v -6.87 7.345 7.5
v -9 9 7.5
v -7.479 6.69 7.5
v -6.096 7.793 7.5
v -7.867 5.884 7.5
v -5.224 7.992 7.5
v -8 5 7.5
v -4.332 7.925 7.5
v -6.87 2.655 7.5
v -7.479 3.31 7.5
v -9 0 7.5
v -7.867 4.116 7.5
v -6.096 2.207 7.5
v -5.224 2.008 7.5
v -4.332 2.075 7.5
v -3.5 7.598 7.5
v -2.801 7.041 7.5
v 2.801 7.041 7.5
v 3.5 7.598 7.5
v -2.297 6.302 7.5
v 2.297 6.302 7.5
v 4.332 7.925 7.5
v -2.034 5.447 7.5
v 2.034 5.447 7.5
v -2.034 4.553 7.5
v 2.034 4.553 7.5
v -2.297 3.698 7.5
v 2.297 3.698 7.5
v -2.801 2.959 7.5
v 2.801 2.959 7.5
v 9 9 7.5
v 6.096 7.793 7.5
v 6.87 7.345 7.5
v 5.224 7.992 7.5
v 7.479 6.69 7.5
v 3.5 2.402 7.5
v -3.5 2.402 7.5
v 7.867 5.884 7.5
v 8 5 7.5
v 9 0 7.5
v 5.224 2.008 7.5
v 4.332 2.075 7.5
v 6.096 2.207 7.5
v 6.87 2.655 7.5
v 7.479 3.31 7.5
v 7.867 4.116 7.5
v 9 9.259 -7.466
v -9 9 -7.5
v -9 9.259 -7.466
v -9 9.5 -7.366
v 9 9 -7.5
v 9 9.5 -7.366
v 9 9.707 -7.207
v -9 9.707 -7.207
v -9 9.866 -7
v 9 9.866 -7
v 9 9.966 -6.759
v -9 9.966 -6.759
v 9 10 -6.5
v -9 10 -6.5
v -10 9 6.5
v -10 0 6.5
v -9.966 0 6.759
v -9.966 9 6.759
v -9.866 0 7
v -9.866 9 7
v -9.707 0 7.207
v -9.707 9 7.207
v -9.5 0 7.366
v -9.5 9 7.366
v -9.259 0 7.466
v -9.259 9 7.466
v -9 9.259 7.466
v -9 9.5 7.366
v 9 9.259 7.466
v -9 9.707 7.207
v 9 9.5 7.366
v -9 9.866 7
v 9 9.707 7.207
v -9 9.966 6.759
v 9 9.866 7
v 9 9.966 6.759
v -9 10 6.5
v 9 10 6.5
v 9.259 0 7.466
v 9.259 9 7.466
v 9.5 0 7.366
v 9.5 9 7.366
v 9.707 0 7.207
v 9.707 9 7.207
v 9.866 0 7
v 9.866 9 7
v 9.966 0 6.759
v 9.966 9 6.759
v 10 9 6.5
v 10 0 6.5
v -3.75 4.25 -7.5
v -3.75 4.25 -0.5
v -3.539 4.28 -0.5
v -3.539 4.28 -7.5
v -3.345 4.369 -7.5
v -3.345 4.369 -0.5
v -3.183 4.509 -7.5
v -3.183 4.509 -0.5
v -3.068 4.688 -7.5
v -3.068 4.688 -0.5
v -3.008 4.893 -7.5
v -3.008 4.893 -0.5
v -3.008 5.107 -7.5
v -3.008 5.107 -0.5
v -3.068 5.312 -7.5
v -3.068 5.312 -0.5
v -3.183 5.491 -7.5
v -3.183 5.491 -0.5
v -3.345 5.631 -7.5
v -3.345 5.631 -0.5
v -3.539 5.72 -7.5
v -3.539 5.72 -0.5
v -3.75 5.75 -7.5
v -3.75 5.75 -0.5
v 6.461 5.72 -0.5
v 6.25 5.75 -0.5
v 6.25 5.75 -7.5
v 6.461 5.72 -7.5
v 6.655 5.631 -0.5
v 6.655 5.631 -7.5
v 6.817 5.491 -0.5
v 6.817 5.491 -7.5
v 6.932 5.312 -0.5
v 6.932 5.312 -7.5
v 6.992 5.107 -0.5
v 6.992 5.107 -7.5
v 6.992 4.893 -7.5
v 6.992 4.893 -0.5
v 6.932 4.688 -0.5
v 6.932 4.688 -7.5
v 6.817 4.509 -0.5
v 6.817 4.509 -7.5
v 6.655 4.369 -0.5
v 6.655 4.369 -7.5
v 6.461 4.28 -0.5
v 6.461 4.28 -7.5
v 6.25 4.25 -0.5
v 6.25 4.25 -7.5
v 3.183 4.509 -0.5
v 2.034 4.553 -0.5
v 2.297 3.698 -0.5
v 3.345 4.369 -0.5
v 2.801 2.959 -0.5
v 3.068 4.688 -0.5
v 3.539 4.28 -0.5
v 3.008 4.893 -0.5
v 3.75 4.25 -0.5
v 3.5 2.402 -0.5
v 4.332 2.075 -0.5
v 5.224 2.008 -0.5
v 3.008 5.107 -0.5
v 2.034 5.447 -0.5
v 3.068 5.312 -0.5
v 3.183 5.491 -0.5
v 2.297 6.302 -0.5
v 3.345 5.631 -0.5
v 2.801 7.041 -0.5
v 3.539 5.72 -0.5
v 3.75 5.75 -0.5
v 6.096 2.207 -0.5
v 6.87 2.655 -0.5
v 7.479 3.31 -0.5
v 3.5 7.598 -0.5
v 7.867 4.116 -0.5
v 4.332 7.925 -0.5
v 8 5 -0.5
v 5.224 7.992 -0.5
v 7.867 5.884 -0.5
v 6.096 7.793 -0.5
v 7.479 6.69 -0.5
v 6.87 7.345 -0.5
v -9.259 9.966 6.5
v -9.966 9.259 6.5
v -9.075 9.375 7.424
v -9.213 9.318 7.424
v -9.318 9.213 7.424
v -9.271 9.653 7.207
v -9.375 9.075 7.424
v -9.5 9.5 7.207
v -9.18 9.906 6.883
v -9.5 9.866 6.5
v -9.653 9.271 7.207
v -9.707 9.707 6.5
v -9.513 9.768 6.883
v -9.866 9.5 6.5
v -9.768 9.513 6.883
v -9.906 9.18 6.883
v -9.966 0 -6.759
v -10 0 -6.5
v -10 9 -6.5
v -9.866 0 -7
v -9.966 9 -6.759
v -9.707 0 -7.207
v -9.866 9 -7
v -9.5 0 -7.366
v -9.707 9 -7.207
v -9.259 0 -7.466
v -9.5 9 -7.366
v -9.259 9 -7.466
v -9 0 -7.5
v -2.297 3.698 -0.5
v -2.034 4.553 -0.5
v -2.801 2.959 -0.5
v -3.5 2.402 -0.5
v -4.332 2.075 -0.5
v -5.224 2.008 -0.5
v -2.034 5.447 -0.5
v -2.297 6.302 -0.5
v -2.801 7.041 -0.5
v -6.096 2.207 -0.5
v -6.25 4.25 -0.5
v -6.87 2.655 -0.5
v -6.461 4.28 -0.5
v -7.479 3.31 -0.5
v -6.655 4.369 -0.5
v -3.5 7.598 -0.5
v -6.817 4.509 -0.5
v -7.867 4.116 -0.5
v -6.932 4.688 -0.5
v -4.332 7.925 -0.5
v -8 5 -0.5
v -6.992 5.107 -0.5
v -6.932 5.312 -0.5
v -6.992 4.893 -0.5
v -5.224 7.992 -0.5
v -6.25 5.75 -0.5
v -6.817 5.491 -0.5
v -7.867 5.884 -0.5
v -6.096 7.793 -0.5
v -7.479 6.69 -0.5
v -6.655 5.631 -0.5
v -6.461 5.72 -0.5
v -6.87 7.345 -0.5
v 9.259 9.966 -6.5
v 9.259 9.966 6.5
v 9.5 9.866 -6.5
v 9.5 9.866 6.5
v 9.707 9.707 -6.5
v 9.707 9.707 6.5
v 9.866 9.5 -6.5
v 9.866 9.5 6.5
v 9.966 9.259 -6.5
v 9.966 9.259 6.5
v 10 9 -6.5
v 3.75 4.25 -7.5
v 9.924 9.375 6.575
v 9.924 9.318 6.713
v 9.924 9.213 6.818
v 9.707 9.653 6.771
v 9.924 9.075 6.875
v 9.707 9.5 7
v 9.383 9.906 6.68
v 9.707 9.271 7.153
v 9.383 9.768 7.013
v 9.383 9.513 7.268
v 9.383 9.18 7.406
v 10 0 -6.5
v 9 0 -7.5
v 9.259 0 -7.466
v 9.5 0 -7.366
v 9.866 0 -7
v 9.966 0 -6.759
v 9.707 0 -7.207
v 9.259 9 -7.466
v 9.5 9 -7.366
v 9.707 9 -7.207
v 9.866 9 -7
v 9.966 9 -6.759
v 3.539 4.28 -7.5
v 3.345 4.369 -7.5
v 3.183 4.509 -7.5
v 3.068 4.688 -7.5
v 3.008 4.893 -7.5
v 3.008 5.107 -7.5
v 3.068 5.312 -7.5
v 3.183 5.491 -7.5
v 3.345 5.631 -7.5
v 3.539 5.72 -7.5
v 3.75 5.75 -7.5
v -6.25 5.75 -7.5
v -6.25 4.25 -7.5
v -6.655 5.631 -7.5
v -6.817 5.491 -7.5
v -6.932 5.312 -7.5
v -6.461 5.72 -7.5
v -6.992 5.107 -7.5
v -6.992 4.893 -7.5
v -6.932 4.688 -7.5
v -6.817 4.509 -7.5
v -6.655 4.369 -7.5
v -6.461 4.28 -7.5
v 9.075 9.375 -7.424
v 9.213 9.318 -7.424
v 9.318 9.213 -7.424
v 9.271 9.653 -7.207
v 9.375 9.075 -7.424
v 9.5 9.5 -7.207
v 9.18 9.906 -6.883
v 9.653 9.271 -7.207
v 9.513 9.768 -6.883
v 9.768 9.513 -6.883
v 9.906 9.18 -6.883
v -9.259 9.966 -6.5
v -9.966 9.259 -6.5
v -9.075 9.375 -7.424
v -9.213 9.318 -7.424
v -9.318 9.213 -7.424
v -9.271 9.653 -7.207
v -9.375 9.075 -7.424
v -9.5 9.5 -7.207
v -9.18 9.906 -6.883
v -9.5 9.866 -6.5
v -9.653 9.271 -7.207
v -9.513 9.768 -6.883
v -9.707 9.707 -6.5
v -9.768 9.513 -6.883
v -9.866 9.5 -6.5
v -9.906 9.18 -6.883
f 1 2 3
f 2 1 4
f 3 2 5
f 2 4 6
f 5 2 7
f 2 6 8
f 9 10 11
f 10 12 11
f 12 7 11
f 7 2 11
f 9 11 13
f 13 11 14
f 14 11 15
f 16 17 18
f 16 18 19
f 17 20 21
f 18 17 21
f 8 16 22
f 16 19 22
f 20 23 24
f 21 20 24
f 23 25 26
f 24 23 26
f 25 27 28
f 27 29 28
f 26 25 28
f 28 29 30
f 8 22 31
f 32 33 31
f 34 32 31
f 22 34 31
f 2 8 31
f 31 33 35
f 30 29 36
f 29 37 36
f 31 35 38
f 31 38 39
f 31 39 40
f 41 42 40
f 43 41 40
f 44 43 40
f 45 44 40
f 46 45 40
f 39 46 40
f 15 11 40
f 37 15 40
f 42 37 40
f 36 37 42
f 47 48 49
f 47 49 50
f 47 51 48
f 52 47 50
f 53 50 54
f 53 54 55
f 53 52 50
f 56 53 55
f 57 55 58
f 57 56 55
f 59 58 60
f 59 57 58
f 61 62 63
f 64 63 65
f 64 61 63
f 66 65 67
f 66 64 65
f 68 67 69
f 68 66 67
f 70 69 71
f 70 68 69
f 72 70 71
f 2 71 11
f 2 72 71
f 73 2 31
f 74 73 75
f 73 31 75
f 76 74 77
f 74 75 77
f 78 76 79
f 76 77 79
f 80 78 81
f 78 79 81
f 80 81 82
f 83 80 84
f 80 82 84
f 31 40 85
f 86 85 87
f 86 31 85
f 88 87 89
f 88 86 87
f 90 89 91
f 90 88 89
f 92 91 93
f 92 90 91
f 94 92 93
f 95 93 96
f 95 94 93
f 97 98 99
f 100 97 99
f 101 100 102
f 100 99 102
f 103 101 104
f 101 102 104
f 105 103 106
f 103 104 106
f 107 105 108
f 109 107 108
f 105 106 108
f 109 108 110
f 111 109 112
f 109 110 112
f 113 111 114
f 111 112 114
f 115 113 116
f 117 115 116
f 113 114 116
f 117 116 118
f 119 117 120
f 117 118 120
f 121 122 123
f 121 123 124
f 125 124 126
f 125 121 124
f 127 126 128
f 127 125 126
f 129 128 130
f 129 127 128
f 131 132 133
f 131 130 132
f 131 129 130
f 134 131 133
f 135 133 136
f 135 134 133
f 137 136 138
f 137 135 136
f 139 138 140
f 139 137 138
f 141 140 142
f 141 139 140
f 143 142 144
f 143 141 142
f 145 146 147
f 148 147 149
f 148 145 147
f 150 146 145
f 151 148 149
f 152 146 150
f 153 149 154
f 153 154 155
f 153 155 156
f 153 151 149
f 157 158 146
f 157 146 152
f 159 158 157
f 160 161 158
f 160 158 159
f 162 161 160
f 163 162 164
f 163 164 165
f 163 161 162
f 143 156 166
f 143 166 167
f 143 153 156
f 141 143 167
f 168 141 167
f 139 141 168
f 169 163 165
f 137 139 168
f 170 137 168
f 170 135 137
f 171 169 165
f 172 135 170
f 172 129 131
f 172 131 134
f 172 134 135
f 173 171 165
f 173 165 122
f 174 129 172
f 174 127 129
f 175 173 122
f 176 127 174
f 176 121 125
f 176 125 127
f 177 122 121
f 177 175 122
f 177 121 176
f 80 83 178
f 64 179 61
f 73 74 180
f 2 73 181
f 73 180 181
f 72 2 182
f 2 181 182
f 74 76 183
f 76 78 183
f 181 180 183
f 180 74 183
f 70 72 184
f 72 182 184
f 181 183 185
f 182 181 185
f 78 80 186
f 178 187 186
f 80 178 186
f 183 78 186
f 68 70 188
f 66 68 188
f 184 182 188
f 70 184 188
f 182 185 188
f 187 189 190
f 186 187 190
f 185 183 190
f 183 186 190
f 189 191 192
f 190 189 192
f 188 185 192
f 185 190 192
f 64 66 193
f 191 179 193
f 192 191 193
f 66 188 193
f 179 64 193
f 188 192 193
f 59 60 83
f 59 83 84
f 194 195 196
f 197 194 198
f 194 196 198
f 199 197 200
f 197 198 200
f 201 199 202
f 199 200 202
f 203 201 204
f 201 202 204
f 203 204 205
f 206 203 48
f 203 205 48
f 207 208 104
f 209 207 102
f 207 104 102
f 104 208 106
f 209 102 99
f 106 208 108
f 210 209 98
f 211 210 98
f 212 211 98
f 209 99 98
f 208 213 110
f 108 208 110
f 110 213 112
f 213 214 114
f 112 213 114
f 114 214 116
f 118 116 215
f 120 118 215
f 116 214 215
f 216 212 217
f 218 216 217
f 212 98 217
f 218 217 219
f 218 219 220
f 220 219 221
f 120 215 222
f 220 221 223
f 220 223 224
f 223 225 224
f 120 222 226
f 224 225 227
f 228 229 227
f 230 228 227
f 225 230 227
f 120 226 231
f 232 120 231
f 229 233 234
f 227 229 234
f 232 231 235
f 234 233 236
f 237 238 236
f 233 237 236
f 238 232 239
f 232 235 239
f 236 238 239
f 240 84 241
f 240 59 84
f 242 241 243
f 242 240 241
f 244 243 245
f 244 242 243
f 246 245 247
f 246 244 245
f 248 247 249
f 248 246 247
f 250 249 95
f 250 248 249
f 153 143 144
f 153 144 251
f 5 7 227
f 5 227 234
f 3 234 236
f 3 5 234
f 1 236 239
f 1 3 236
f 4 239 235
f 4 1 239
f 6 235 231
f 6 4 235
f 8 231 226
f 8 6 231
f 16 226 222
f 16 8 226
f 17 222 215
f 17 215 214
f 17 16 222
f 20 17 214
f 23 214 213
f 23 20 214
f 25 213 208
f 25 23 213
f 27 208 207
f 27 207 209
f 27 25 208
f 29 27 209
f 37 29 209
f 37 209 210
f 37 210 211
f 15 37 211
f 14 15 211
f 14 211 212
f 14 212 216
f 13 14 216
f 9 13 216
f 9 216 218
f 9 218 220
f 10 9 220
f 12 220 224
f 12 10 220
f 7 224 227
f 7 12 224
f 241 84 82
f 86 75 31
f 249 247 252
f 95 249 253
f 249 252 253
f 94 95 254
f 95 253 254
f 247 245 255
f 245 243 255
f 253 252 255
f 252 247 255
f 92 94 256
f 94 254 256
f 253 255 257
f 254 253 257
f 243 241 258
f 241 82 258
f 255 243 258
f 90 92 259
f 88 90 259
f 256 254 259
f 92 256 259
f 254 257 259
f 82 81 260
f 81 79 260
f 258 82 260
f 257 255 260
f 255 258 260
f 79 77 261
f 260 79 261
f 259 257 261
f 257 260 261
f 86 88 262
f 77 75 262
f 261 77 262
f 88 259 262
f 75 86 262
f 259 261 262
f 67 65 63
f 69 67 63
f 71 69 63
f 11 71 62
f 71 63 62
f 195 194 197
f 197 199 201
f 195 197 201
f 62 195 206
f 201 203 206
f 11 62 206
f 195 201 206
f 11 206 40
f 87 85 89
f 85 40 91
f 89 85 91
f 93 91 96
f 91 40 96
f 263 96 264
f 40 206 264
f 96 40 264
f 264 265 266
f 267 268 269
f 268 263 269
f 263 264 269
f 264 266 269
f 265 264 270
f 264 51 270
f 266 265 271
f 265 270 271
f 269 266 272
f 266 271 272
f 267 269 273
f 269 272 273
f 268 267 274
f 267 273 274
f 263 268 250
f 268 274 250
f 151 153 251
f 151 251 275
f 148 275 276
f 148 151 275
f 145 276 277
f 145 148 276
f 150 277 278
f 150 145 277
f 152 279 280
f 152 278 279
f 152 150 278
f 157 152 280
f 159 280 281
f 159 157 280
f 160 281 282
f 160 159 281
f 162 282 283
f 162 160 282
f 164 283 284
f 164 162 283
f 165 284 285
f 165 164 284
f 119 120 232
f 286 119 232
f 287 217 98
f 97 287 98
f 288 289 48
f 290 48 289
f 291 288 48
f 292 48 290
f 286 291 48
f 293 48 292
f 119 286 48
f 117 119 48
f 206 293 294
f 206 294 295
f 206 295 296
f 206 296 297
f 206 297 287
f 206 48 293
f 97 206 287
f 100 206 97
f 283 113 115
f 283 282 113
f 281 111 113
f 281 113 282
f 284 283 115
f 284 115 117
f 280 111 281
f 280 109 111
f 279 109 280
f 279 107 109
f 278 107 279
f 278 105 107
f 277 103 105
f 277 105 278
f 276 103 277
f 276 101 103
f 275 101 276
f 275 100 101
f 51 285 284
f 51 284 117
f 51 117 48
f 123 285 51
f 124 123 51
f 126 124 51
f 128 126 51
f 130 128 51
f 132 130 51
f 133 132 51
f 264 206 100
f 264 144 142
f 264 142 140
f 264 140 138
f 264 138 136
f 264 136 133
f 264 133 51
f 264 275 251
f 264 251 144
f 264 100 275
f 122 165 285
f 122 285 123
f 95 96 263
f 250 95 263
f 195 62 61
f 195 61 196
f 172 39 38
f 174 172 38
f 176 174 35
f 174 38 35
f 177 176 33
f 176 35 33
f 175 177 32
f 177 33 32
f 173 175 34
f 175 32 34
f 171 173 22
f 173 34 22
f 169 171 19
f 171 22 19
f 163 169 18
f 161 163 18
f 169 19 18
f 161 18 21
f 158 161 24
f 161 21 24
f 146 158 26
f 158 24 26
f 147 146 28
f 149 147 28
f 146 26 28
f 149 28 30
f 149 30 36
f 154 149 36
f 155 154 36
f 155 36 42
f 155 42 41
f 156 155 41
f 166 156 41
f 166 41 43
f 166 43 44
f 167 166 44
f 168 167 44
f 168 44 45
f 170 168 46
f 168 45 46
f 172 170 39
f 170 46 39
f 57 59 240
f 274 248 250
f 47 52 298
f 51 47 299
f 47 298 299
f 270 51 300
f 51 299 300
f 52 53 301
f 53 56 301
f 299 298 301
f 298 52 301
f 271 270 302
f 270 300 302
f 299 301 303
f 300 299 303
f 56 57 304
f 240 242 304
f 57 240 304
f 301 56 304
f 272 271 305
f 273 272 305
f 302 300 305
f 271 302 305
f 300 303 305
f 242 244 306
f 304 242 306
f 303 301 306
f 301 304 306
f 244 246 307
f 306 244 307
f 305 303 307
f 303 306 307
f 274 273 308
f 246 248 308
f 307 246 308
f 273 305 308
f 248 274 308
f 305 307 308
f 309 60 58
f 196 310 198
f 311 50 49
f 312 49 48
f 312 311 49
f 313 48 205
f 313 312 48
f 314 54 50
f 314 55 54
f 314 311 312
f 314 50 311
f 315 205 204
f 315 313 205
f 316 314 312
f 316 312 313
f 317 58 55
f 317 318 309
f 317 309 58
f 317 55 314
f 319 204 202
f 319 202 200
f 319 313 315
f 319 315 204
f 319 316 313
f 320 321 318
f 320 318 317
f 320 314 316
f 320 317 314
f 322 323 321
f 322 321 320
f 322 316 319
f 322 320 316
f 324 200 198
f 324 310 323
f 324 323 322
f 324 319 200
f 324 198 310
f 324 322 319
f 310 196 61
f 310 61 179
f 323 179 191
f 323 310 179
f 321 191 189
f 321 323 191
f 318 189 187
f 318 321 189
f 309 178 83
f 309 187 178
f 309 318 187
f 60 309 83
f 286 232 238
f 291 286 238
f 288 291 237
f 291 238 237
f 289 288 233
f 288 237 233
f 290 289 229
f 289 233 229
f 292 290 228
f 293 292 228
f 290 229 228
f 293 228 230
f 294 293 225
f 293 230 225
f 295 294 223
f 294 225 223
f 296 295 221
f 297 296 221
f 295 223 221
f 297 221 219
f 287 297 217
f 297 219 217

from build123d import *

# Parameters (mm, degrees)
SKETCH1_W           = 20
SKETCH1_H           = 15
BOSS_EXTRUDE1_DEPTH = 10
SKETCH4_R           = 3
CUT_EXTRUDE1_DEPTH  = 8
CUT_EXTRUDE2_DEPTH  = 8
FILLET1_R           = 1


with BuildPart() as part:
    # Sketch1 → Boss-Extrude1 (new body)
    with BuildSketch(Plane(origin=(0, 0, 0), x_dir=(1, 0, 0), z_dir=(0, 1, 0))):
        Rectangle(SKETCH1_W, SKETCH1_H)
    extrude(amount=BOSS_EXTRUDE1_DEPTH)

    # Sketch4 → Cut-Extrude1 (cut)
    with BuildSketch(Plane.XY.offset(7.5)):
        with Locations((5, 5)):
            Circle(SKETCH4_R)
    cut_extrude1 = extrude(amount=-CUT_EXTRUDE1_DEPTH, mode=Mode.SUBTRACT)

    # Sketch6 → Cut-Extrude2 (cut, through all)
    with BuildSketch(Plane.XY.offset(-0.5)):
        with BuildLine():
            Line((3.75, 5.75), (6.25, 5.75))
            ThreePointArc((6.25, 5.75), (7, 5), (6.25, 4.25))
            Line((6.25, 4.25), (3.75, 4.25))
            ThreePointArc((3.75, 4.25), (3, 5), (3.75, 5.75))
        make_face()
    cut_extrude2 = extrude(amount=-CUT_EXTRUDE2_DEPTH, mode=Mode.SUBTRACT)

    # Mirror1: Cut-Extrude1, Cut-Extrude2 across plane
    add(cut_extrude1.mirror(Plane(origin=(0, 0, 0), x_dir=(0, 0, 1), z_dir=(1, 0, 0))), mode=Mode.SUBTRACT)
    add(cut_extrude2.mirror(Plane(origin=(0, 0, 0), x_dir=(0, 0, 1), z_dir=(1, 0, 0))), mode=Mode.SUBTRACT)

    # Fillet1
    fillet1_edges = [part.edges().sort_by_distance(p)[0] for p in [
        (-10, 10, 0),
        (0, 10, 7.5),
        (10, 10, 0),
        (0, 10, -7.5),
        (10, 5, 7.5),
        (-10, 5, 7.5),
        (-10, 5, -7.5),
        (10, 5, -7.5),
    ]]
    fillet(fillet1_edges, radius=FILLET1_R)


solid = part.part
